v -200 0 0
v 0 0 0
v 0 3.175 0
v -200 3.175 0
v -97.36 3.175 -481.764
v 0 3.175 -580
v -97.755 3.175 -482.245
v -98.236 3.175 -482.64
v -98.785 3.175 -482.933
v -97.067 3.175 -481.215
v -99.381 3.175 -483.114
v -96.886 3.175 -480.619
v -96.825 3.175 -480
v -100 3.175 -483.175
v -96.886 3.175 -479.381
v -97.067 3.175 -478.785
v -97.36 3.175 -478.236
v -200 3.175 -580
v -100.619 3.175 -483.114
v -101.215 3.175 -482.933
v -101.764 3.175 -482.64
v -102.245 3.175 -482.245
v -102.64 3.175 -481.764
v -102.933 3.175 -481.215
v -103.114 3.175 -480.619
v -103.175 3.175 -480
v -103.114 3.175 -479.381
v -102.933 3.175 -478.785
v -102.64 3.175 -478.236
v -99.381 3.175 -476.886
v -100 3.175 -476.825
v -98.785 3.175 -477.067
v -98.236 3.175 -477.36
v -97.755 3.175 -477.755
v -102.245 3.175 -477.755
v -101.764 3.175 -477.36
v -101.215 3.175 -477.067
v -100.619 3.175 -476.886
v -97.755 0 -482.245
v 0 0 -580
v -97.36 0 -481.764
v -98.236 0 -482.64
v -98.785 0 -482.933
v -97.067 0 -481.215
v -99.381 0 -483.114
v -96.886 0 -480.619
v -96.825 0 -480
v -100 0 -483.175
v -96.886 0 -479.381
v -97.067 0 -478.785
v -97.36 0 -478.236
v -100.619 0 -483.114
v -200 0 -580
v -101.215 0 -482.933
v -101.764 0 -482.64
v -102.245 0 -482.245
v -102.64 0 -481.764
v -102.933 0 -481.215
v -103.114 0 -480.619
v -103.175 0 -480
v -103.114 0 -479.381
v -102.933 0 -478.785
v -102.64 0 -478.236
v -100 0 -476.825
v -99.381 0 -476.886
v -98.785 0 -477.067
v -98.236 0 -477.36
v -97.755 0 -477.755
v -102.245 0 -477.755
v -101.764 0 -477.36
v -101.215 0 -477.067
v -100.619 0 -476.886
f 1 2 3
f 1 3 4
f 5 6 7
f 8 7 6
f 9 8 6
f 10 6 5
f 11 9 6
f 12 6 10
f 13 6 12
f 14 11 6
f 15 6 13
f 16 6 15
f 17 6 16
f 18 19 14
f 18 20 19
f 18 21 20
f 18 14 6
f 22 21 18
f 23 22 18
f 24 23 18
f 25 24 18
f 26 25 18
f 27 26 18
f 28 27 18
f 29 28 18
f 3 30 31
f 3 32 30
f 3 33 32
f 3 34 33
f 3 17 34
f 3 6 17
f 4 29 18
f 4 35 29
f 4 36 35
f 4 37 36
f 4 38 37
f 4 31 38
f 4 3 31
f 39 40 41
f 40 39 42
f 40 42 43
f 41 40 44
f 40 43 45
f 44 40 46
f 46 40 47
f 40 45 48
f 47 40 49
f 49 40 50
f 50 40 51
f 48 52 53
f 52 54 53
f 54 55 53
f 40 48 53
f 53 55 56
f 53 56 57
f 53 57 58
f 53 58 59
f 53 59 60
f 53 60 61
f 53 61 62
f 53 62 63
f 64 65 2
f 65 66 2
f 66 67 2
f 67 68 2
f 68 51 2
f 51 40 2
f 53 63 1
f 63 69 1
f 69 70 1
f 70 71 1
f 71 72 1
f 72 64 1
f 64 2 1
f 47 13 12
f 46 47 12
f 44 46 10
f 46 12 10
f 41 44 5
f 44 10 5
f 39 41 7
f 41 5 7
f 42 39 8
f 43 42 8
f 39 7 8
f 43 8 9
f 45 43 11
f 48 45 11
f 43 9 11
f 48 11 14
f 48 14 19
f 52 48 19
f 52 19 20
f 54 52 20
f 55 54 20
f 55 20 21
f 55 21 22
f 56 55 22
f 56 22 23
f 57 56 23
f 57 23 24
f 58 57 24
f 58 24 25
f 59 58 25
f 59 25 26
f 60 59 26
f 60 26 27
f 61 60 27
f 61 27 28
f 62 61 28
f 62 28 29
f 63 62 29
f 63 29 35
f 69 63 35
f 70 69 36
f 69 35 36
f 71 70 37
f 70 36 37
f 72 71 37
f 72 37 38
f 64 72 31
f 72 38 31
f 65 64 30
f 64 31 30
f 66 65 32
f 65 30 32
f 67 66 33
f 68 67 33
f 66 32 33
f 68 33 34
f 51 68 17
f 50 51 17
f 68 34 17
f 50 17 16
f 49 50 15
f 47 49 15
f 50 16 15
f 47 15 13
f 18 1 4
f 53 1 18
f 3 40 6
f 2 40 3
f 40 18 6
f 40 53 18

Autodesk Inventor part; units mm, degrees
ref_plane "YZ Plane" through (0, 0, 0) normal (1, 0, 0) x (0, 1, 0)
ref_plane "XZ Plane" through (0, 0, 0) normal (0, 1, 0) x (-1, 0, 0)
ref_plane "XY Plane" through (0, 0, 0) normal (0, 0, 1) x (1, 0, 0)
sketch "Sketch1" plane through (0, 0, 0) normal (0, 1, 0) x (-1, 0, 0)
  line L0 (0, 0) -> (200, 0)
  line L1 (200, 0) -> (200, -480)
  line L2 (200, -480) -> (0, -480)
  line L3 (0, -480) -> (0, 0)
  line L4 (0, -480) -> (100, -480)
  line L5 (200, -480) -> (200, -580)
  line L6 (200, -580) -> (0, -580)
  line L7 (0, -580) -> (0, -480)
  dimension "d0" = 200
  dimension "d1" = 480
extrude "Extrusion1" add sketch "Sketch1" along normal blind 3.175
sketch "Sketch2" plane through (0, 3.175, 0) normal (0, 1, 0) x (1, 0, 0)
  circle A0 centre (-100, 480) radius 3.175
  point P0 (0, 0)
  dimension "d5" = 6.35
extrude "Extrusion2" cut sketch "Sketch2" against normal blind 3.175
properties part number "Trebuchet V1 - Long Arm (Sling)"
